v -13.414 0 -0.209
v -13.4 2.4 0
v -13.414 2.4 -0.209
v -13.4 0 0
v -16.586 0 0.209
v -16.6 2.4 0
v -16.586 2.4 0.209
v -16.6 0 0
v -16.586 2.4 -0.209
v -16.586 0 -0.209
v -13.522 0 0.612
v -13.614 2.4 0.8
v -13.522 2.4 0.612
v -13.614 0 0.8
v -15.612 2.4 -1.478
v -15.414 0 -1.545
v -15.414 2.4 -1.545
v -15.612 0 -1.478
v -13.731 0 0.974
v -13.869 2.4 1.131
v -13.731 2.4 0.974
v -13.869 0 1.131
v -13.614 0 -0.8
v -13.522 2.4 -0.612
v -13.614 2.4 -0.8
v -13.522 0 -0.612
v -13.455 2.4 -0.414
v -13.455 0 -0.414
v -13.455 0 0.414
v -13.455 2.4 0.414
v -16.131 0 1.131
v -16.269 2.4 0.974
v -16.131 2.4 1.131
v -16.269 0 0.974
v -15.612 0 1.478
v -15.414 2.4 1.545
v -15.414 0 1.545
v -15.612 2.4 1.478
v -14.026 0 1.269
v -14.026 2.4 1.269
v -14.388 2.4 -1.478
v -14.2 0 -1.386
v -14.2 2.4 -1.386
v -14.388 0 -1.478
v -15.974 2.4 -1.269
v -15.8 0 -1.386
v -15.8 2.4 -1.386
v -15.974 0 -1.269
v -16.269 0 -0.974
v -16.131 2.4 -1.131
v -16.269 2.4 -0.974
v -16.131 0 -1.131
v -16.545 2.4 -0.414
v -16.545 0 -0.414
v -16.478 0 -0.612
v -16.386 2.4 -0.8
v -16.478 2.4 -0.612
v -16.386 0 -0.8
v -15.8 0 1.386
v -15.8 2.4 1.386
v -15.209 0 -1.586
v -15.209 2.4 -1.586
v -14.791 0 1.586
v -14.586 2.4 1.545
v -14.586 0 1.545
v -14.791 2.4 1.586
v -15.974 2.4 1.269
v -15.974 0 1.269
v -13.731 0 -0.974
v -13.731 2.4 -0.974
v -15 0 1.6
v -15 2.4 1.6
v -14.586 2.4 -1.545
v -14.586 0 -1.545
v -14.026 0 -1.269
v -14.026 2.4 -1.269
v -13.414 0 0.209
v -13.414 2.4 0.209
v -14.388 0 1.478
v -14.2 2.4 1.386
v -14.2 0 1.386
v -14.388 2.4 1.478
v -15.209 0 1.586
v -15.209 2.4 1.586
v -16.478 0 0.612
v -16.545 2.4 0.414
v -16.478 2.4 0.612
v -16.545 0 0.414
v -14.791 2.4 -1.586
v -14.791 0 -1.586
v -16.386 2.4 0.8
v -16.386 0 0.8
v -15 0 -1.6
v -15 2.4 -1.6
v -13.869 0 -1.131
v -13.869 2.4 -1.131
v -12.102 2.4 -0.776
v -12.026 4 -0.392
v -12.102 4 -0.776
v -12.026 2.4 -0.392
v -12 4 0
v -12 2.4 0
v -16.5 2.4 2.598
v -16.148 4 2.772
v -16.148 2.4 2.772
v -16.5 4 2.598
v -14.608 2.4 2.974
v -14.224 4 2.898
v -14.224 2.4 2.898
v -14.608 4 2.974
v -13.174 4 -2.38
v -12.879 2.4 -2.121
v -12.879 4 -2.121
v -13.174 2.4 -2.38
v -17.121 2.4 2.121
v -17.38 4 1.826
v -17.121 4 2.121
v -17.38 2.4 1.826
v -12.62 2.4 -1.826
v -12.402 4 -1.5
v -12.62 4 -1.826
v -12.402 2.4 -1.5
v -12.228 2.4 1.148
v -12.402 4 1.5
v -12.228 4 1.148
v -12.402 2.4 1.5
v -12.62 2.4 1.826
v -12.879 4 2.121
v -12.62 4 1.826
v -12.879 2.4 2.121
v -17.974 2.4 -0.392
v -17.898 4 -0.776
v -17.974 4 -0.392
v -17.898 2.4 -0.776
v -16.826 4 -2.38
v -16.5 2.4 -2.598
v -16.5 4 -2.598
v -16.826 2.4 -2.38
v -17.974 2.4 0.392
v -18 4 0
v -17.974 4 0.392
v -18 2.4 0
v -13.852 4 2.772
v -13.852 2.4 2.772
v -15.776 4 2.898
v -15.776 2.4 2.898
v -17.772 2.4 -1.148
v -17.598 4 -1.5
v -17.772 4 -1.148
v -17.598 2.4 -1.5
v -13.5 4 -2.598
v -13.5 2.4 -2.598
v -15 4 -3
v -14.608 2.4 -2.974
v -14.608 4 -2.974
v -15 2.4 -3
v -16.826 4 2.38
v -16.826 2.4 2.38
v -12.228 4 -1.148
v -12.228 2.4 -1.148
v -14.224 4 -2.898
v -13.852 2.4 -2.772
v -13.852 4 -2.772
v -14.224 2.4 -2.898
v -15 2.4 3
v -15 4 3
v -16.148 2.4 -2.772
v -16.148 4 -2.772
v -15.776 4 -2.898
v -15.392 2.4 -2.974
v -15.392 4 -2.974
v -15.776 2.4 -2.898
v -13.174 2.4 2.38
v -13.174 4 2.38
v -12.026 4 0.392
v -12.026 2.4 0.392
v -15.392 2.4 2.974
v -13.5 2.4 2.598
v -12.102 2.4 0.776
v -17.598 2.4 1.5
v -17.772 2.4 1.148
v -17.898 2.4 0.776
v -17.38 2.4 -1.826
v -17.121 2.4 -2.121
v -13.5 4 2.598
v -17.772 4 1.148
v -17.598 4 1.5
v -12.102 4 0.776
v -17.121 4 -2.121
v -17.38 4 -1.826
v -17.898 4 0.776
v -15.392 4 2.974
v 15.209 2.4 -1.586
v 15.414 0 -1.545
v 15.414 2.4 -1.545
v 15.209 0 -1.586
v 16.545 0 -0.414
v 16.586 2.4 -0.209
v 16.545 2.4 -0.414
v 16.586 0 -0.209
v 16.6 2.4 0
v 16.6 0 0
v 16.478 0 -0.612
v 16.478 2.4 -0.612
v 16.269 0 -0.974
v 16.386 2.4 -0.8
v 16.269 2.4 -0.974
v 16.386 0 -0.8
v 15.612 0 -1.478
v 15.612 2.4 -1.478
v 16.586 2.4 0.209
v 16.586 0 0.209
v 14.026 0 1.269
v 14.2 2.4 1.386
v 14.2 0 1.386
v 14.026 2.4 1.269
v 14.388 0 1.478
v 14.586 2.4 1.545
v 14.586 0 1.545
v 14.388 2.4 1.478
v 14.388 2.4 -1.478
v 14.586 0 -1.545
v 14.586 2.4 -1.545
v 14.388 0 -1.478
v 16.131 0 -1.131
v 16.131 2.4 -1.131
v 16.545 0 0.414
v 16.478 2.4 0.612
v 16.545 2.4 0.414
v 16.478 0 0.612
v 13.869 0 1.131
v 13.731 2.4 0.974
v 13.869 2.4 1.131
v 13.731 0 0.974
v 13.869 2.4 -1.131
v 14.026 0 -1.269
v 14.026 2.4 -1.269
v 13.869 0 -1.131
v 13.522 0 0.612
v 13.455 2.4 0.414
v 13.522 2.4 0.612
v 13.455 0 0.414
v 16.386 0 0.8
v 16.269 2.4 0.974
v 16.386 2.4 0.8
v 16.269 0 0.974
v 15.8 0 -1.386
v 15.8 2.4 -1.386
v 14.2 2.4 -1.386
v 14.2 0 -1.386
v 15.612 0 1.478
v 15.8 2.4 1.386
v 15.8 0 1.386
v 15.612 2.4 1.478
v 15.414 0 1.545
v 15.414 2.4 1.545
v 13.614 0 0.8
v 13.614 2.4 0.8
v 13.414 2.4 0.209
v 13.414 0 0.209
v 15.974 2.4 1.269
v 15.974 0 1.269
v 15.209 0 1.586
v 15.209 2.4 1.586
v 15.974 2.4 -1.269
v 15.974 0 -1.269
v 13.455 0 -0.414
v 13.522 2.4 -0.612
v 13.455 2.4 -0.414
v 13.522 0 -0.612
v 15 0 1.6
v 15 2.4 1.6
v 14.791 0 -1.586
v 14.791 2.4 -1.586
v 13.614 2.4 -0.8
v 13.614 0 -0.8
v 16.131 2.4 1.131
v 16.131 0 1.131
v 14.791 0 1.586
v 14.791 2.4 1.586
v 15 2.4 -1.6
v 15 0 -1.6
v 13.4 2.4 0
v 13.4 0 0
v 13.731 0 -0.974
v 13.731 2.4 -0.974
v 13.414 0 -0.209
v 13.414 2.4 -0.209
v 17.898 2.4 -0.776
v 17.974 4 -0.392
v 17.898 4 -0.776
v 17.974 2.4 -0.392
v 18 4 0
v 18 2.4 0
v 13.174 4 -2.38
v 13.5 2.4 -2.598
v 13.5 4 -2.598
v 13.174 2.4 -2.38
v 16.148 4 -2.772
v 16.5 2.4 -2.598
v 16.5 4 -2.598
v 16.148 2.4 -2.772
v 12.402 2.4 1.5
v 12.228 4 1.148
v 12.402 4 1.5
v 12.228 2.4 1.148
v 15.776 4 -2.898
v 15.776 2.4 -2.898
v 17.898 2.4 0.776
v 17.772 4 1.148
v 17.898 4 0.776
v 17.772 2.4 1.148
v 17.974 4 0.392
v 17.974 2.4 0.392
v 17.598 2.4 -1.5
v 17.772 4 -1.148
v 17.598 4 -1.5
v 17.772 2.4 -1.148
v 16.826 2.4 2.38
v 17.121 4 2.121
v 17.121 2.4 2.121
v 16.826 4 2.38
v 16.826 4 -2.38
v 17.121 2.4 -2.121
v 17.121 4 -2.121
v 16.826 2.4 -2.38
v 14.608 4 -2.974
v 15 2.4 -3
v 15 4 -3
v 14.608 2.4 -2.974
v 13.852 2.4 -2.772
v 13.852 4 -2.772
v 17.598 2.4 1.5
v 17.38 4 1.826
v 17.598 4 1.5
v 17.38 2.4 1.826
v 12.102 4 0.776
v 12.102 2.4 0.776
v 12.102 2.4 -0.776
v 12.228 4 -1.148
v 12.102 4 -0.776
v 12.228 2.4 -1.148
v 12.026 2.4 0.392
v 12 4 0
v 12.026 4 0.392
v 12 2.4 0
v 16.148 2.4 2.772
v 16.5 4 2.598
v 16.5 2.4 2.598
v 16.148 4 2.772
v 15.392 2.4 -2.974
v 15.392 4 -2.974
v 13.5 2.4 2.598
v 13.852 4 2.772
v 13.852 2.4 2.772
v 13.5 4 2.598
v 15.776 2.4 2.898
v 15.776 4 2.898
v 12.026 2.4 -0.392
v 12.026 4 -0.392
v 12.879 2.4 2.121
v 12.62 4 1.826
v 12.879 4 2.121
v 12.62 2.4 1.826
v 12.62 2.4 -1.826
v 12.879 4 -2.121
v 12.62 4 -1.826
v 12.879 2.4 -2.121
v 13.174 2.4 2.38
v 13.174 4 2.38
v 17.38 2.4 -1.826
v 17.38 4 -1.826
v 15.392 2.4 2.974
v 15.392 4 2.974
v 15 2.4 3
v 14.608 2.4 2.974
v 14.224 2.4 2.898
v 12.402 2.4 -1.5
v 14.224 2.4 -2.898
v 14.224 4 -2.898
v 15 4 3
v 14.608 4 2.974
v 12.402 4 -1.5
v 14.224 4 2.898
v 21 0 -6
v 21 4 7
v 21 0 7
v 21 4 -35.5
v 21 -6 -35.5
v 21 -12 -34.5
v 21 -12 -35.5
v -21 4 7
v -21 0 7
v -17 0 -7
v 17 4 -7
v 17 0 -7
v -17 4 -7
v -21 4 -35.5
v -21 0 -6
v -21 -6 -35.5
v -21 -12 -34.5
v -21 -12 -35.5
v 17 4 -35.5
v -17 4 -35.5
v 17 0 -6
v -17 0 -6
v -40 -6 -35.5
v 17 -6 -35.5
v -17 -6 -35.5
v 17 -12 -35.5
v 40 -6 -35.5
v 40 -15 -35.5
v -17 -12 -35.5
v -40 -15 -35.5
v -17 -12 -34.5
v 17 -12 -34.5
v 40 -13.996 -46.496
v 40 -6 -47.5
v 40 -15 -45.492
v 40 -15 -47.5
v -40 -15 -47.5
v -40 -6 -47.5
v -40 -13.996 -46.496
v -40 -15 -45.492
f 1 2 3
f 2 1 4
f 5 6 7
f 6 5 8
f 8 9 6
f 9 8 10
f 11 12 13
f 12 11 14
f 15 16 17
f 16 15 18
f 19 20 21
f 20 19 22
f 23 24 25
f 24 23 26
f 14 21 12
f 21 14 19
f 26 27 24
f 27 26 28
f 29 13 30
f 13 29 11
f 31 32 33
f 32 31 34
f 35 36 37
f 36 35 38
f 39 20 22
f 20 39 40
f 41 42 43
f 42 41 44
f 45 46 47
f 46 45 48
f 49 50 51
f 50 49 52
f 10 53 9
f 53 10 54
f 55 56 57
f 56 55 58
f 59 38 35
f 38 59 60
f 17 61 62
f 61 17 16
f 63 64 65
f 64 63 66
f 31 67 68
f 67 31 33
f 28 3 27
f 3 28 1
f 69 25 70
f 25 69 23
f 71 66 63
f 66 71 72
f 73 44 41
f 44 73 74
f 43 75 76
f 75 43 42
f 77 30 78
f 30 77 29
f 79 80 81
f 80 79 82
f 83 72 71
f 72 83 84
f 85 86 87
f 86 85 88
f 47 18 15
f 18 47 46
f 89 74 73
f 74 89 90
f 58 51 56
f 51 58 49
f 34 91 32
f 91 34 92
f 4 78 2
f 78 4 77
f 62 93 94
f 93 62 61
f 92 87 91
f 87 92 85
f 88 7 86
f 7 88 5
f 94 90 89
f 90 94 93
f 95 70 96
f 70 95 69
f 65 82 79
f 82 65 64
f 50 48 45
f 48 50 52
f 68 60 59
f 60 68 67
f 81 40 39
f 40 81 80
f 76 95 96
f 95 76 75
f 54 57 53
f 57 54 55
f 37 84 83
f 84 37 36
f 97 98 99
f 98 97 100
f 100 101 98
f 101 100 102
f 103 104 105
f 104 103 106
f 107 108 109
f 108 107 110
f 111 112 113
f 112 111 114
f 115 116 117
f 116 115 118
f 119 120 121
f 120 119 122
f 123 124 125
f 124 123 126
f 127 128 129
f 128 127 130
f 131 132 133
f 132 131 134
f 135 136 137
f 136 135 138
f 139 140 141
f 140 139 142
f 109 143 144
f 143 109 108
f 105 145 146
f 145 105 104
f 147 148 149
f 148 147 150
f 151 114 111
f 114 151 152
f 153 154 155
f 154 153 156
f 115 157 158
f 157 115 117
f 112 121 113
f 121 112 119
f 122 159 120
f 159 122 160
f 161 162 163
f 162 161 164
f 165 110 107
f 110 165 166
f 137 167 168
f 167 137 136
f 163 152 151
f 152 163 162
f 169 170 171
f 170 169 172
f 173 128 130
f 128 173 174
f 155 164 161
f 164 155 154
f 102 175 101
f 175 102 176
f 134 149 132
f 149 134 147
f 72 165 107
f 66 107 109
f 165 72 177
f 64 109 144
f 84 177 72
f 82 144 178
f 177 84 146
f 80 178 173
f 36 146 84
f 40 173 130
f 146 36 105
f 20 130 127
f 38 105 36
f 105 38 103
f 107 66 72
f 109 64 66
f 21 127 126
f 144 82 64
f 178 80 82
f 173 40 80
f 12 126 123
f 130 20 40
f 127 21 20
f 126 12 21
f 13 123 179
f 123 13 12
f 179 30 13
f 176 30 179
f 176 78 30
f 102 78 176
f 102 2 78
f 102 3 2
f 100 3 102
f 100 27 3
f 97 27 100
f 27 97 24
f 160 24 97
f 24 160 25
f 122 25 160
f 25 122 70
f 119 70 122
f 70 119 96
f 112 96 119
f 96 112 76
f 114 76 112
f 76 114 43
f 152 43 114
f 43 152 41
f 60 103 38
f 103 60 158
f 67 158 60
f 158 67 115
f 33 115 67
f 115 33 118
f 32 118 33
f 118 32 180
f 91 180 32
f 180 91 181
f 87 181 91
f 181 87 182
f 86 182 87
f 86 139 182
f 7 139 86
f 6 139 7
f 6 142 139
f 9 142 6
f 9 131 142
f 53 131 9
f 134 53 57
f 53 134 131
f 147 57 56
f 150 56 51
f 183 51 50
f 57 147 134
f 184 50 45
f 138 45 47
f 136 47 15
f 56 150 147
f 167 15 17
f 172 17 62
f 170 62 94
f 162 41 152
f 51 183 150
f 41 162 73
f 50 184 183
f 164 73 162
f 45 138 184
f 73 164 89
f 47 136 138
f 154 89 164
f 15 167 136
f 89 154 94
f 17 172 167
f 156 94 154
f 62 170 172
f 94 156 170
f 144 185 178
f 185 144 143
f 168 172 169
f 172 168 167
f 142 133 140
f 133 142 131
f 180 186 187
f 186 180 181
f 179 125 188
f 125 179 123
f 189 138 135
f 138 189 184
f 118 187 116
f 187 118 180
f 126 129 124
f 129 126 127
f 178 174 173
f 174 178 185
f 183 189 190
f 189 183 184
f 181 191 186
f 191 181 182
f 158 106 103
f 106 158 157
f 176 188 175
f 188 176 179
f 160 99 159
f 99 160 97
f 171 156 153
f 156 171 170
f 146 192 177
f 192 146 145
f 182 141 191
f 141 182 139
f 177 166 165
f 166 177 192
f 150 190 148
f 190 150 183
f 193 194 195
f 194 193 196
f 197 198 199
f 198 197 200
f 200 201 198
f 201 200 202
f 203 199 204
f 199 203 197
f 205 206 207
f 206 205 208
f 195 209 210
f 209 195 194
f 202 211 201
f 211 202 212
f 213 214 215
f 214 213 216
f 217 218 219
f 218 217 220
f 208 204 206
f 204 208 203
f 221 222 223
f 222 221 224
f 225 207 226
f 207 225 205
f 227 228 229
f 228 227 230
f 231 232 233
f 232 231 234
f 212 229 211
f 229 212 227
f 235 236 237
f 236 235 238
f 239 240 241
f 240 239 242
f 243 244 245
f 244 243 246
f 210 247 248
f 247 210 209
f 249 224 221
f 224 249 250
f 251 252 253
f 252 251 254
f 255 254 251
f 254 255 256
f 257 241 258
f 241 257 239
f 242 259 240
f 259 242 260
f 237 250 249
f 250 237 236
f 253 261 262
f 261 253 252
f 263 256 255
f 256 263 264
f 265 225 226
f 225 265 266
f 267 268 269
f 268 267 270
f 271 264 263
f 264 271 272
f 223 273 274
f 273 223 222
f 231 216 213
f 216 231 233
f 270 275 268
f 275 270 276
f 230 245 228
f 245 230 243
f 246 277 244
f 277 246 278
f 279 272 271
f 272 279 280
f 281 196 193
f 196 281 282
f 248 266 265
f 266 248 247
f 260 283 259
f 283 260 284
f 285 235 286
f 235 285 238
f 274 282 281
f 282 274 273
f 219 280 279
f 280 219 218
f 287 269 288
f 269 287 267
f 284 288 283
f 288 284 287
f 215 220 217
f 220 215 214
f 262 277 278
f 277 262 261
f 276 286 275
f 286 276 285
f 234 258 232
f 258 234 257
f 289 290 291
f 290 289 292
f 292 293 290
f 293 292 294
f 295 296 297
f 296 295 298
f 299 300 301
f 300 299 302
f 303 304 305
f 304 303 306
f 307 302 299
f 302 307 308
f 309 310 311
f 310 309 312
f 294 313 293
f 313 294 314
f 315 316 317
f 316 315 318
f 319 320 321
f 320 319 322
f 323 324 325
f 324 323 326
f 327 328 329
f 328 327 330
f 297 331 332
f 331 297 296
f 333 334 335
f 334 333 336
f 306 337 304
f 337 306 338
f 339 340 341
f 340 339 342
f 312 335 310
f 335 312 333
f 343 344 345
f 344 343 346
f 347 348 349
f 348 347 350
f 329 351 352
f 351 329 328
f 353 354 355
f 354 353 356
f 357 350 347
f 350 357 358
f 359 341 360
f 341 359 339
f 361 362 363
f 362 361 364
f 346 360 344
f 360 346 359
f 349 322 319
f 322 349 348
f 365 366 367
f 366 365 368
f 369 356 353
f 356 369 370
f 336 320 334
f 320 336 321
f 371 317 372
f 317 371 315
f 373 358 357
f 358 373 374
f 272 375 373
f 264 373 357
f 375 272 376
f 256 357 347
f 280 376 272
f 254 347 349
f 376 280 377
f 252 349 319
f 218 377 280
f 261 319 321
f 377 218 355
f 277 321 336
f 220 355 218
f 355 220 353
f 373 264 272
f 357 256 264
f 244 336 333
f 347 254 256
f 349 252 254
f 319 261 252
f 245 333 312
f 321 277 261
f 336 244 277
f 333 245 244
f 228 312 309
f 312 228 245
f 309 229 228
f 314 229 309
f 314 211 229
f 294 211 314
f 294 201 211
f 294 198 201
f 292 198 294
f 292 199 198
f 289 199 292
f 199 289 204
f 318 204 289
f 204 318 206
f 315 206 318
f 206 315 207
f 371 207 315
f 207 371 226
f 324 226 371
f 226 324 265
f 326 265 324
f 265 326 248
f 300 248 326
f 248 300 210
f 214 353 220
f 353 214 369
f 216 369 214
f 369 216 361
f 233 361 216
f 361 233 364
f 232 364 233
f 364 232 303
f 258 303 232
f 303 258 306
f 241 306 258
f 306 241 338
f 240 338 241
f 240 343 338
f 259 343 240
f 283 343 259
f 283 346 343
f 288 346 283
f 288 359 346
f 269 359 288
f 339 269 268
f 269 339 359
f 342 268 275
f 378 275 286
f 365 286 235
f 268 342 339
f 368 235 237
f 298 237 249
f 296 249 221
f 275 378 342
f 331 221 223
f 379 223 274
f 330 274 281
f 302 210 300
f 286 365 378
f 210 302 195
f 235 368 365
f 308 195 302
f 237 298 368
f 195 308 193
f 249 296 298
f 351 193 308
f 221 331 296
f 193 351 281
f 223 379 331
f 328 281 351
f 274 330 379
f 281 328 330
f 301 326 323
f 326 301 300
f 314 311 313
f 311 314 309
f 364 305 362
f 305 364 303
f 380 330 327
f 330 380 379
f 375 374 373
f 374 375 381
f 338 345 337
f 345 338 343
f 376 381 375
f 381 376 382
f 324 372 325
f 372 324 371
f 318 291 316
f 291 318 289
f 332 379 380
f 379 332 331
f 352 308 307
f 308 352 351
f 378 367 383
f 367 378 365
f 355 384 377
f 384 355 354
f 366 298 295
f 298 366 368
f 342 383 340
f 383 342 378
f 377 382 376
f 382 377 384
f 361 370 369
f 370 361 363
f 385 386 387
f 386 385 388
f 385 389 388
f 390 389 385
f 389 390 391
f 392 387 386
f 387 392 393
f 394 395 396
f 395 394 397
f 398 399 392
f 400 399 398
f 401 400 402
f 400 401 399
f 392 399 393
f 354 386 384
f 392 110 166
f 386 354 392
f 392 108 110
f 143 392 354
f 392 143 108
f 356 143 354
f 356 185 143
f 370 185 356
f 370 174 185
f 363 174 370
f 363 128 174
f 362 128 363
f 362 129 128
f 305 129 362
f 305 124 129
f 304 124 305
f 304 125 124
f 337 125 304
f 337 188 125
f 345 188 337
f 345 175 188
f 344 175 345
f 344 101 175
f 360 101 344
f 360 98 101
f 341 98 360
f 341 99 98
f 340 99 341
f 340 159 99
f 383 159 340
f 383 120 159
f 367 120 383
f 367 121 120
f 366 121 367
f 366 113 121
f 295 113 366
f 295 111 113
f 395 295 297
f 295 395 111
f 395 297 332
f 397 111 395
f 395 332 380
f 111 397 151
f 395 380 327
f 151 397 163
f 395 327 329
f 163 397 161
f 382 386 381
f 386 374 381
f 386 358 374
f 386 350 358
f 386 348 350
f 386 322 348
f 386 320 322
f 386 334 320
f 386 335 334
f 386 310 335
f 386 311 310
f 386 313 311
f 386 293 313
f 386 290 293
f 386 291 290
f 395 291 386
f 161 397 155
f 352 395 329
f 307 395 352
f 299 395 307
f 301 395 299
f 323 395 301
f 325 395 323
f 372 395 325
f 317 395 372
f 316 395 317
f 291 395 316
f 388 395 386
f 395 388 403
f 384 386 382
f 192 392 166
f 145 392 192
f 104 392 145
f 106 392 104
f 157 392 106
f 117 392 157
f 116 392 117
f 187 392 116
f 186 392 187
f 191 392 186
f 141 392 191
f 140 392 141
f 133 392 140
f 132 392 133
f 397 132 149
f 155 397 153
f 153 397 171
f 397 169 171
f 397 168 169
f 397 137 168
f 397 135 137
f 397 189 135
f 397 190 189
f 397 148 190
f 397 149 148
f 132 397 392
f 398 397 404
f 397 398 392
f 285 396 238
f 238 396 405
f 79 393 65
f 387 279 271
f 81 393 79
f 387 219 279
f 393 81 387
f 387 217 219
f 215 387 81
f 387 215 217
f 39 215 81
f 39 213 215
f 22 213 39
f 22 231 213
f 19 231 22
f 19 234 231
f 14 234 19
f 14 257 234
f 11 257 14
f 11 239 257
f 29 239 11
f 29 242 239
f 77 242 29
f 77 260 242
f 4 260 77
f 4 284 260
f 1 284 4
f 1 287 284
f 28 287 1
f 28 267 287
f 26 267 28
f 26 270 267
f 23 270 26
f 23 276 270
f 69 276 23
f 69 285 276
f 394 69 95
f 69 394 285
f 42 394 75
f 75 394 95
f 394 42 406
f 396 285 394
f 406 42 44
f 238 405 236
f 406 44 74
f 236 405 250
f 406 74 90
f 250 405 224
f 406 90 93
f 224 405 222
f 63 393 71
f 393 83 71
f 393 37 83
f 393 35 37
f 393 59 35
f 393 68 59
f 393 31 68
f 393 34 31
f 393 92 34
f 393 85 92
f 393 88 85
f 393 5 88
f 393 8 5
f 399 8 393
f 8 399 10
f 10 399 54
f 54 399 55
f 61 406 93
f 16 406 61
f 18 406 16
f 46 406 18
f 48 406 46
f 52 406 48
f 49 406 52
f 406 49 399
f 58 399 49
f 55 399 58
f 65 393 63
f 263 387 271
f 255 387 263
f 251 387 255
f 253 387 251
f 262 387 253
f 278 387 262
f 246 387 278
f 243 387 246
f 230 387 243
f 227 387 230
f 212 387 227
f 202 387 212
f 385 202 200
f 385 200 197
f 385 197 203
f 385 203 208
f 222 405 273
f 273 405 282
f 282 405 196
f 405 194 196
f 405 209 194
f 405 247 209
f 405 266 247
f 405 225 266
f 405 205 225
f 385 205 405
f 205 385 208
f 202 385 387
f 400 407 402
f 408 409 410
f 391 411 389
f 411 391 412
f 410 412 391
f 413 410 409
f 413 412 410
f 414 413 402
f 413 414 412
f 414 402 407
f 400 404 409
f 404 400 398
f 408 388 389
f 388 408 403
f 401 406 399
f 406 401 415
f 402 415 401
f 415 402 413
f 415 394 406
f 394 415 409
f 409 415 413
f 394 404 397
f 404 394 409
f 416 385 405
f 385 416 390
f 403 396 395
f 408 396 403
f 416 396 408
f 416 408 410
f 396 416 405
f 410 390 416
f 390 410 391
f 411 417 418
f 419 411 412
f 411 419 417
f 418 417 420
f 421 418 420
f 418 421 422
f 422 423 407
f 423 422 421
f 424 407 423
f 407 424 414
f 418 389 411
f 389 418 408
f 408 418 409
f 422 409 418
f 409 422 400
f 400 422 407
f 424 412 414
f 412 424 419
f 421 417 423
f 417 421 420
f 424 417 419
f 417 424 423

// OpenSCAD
// klipper-auto-eject - parametric blade (plow)
// https://github.com/ahmedbebars/klipper-auto-eject
//
// A starting point, not a drop-in part: every toolhead is different.
// Measure your toolhead, set the parameters below, render, and check the
// fit before printing. Print in PETG/ABS/ASA, 4+ walls, 40% infill, with the
// blade face standing upright on the bed.
//
// Copyright (C) 2026 Ahmed Bebars
// This file may be distributed under the terms of the GNU GPLv3 license.

/* [Mount] */
// Spacing between the two mounting screws (mm)
screw_spacing = 30;
// Screw diameter (M3 = 3.2 clearance)
screw_d = 3.2;
// Screw head diameter (for the counterbore)
screw_head_d = 6.0;
// Mount plate width (mm)
mount_width = 42;
// Mount plate height (mm)
mount_height = 14;
// Mount plate thickness (mm)
mount_thickness = 4;

/* [Geometry] */
// Vertical distance from the screw centres down to the nozzle tip (mm)
screws_above_nozzle = 35;
// Gap between the blade's lower edge and the nozzle tip (mm, positive = blade higher)
blade_lift = 1.5;
// How far the blade face sits in front of the mount plate (mm)
blade_reach = 12;

/* [Blade] */
// Blade width (mm) - set blade_width in auto_eject_settings.cfg to match
blade_width = 80;
// Blade height (mm)
blade_height = 12;
// Blade thickness (mm)
blade_thickness = 3;
// Chamfer on the lower front edge so it rides over small bumps (mm)
edge_chamfer = 1.0;

$fn = 48;

arm_length = screws_above_nozzle - blade_lift - blade_height + mount_height / 2;

module mount_plate() {
    difference() {
        translate([-mount_width / 2, 0, -mount_height / 2])
            cube([mount_width, mount_thickness, mount_height]);
        for (x = [-screw_spacing / 2, screw_spacing / 2]) {
            translate([x, -1, 0]) rotate([-90, 0, 0])
                cylinder(d = screw_d, h = mount_thickness + 2);
            translate([x, mount_thickness - 1.6, 0]) rotate([-90, 0, 0])
                cylinder(d = screw_head_d, h = 2);
        }
    }
}

module arm() {
    // two ribs from the plate down to the blade
    for (x = [-mount_width / 2, mount_width / 2 - 4])
        hull() {
            translate([x, 0, -mount_height / 2]) cube([4, mount_thickness, 1]);
            translate([x, -blade_reach, -mount_height / 2 - arm_length])
                cube([4, blade_reach + mount_thickness, 1]);
        }
}

module blade() {
    z0 = -mount_height / 2 - arm_length - blade_height;
    difference() {
        translate([-blade_width / 2, -blade_reach - blade_thickness, z0])
            cube([blade_width, blade_thickness + blade_reach / 2, blade_height]);
        // chamfer the lower front edge
        translate([-blade_width / 2 - 1, -blade_reach - blade_thickness, z0])
            rotate([45, 0, 0])
                cube([blade_width + 2, edge_chamfer * 1.42, edge_chamfer * 1.42]);
    }
}

union() {
    mount_plate();
    arm();
    blade();
}
